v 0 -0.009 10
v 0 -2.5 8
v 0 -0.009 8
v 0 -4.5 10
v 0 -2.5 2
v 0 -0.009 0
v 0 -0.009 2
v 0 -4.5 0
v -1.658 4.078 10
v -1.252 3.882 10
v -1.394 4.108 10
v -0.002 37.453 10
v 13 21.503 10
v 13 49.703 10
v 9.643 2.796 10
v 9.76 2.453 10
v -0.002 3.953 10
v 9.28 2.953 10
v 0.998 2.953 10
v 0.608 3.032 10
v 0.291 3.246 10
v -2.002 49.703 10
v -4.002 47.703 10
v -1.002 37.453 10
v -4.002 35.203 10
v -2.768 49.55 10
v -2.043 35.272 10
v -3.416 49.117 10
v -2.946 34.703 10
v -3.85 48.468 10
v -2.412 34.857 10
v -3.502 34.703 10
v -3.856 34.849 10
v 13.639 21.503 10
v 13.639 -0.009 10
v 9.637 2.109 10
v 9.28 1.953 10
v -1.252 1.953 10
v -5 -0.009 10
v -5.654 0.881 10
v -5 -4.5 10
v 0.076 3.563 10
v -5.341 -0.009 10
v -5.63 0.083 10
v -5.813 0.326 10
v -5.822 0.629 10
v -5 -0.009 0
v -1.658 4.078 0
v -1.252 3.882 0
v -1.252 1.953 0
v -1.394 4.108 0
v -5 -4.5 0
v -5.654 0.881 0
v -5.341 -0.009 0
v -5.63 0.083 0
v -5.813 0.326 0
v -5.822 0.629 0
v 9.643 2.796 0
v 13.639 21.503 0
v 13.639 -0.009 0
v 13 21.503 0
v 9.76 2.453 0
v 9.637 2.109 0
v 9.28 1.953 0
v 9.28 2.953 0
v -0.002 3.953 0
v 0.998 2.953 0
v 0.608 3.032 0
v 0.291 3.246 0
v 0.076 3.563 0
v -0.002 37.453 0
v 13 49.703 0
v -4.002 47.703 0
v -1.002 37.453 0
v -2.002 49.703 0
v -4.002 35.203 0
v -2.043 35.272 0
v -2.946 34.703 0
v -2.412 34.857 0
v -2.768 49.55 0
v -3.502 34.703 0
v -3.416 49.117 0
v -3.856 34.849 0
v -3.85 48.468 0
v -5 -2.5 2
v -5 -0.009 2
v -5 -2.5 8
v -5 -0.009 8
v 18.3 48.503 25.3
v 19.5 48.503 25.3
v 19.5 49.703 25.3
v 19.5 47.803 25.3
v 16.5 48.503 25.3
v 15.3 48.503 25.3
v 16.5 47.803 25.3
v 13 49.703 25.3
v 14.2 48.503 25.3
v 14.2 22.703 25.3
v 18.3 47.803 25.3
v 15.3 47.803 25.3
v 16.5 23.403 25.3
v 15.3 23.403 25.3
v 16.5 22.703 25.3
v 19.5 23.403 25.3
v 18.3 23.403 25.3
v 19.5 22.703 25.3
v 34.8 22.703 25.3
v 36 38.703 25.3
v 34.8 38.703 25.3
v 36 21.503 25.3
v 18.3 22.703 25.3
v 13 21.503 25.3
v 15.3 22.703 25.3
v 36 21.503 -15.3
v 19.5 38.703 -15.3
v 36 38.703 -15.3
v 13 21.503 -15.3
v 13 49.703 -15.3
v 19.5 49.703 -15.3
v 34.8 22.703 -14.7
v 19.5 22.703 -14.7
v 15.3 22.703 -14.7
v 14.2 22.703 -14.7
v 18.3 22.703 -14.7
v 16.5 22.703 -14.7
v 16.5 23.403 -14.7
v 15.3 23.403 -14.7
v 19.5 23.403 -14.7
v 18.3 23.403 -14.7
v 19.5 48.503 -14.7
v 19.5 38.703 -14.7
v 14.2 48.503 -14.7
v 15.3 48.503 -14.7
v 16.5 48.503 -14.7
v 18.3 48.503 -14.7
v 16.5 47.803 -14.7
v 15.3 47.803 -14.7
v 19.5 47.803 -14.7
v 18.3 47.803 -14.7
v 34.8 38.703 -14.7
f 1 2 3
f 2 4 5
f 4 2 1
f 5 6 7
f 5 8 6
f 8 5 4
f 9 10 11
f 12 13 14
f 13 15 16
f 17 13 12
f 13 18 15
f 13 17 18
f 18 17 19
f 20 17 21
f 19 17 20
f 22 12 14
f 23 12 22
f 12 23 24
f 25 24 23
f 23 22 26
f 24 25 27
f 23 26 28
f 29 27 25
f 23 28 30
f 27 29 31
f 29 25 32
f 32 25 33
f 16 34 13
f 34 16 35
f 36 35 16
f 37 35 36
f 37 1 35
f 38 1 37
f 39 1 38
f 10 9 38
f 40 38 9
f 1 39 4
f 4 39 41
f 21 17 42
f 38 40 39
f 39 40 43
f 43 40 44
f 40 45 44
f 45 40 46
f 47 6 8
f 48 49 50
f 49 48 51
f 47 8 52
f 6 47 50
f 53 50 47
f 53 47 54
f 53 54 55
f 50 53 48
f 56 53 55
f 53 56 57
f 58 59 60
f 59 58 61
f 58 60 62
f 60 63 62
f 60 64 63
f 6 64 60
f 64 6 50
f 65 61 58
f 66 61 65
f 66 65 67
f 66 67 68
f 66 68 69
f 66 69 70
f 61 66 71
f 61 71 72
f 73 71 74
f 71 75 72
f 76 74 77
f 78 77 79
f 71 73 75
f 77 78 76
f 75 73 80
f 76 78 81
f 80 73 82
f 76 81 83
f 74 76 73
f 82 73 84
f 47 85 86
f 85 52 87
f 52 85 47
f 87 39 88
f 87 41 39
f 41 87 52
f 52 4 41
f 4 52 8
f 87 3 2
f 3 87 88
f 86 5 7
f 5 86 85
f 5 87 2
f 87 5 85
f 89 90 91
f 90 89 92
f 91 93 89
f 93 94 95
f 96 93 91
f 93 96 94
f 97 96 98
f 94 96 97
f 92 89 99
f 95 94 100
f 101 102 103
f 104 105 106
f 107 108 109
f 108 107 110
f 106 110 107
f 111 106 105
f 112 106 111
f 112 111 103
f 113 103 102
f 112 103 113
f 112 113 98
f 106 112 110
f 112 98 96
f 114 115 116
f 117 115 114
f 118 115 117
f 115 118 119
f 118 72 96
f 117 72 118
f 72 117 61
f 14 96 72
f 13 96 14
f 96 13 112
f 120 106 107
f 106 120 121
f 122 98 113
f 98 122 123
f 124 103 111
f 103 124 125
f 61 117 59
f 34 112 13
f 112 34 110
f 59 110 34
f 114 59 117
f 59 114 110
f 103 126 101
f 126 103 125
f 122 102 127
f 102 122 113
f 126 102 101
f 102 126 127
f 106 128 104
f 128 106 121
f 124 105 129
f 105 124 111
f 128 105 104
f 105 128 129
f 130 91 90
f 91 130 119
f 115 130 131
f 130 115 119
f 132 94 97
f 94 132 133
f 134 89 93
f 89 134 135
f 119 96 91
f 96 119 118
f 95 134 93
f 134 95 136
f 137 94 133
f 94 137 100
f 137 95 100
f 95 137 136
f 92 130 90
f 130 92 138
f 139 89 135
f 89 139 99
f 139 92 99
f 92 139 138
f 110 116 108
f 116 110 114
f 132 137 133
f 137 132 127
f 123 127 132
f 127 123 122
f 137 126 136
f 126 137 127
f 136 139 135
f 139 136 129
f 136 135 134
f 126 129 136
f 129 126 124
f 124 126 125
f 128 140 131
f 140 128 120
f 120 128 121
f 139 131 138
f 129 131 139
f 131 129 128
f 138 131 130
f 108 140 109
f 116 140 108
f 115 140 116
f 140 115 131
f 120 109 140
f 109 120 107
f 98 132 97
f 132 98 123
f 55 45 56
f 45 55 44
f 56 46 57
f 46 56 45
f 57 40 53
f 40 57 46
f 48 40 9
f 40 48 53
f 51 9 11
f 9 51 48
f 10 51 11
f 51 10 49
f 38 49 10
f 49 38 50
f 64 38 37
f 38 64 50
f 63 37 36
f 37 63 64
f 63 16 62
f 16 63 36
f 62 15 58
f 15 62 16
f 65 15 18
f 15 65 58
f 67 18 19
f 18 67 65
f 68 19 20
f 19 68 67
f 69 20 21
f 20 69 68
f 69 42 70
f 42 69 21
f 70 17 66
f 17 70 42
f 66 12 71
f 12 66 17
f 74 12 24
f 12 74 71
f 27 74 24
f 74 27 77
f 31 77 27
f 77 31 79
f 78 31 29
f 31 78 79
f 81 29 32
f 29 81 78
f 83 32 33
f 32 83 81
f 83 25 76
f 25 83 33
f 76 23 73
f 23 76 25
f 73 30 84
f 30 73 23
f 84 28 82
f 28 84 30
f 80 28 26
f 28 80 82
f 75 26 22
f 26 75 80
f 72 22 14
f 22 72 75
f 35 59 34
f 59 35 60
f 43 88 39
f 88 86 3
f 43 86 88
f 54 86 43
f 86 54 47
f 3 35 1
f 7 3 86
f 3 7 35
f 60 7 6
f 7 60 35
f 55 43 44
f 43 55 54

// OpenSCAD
clipHeight = 49.7026;
clipWidth = 10;

clipHookThickness = 2;
clipHookOpening = 2.5;
clipHookDepth = 5;

buildPlateX = 13.0;

mountThickness = 1.2;
sideThickness = 0.6;
gripOverlap = 0.7;

heightTolerance = 0.25;
thicknessTolerance = 0.1;
undersideTolerance = 2.4;

guardDistance = 16.5;
guardHeight = 16;

moduleHeight = 25.3;
moduleWidth = 40;
modulePlateThickness = 1.6;

moduleMountWidth = moduleWidth + sideThickness;
moduleMountHeight = moduleHeight + 2 * (heightTolerance + mountThickness);
moduleMountDepth = mountThickness + undersideTolerance + thicknessTolerance + modulePlateThickness + mountThickness;

// Original CC-BY Robert Hunt:
// https://www.thingiverse.com/thing:101024
module dinClip() {
    translate([13.78, -0.15, 0])
    scale([-1, 1, 1])
	difference() {
		linear_extrude(height=clipWidth, convexity=5)
        import(file="din_clip_01.dxf", layer="0", $fn=64);
    }
}

module moduleMount() {
    cube([mountThickness, moduleMountHeight, moduleMountWidth]);
    cube([moduleMountDepth, moduleMountHeight, sideThickness]);
    
    mountGrip();
    
    translate([0, moduleMountHeight, 0])
    scale([1, -1, 1])
    mountGrip();
    
    guard();
}

module mountGrip() {
    cube([moduleMountDepth, mountThickness, moduleMountWidth]);
    
    translate([mountThickness + undersideTolerance - thicknessTolerance - mountThickness, 0, 0])
    cube([mountThickness, mountThickness + gripOverlap, moduleMountWidth]);
    
    translate([mountThickness + undersideTolerance + modulePlateThickness + thicknessTolerance, 0, 0])
    cube([mountThickness, mountThickness + gripOverlap, moduleMountWidth]);
}

module guard() {
    cube([moduleMountDepth + guardDistance, mountThickness, moduleMountWidth]);
    
    cube([moduleMountDepth + guardDistance, guardHeight + mountThickness, sideThickness]);
    
    translate([moduleMountDepth + guardDistance - mountThickness, 0, 0])
    cube([mountThickness, guardHeight + mountThickness, moduleMountWidth]);
}

module clipHook() {
    difference() {
        cube([clipHookDepth, clipHookThickness + clipHookOpening, clipWidth]);
        
        translate([0, clipHookThickness, clipHookThickness])
        cube([clipHookDepth, clipHookOpening, clipWidth - 2 * clipHookThickness]);
    }
}

module fullAssembly() {
    dinClip();
    
    translate([-clipHookDepth, -clipHookThickness - clipHookOpening, 0])
    clipHook();
    
    translate([buildPlateX, (clipHeight - moduleMountHeight), (clipWidth - moduleMountWidth) / 2])
    moduleMount();
}

fullAssembly();
